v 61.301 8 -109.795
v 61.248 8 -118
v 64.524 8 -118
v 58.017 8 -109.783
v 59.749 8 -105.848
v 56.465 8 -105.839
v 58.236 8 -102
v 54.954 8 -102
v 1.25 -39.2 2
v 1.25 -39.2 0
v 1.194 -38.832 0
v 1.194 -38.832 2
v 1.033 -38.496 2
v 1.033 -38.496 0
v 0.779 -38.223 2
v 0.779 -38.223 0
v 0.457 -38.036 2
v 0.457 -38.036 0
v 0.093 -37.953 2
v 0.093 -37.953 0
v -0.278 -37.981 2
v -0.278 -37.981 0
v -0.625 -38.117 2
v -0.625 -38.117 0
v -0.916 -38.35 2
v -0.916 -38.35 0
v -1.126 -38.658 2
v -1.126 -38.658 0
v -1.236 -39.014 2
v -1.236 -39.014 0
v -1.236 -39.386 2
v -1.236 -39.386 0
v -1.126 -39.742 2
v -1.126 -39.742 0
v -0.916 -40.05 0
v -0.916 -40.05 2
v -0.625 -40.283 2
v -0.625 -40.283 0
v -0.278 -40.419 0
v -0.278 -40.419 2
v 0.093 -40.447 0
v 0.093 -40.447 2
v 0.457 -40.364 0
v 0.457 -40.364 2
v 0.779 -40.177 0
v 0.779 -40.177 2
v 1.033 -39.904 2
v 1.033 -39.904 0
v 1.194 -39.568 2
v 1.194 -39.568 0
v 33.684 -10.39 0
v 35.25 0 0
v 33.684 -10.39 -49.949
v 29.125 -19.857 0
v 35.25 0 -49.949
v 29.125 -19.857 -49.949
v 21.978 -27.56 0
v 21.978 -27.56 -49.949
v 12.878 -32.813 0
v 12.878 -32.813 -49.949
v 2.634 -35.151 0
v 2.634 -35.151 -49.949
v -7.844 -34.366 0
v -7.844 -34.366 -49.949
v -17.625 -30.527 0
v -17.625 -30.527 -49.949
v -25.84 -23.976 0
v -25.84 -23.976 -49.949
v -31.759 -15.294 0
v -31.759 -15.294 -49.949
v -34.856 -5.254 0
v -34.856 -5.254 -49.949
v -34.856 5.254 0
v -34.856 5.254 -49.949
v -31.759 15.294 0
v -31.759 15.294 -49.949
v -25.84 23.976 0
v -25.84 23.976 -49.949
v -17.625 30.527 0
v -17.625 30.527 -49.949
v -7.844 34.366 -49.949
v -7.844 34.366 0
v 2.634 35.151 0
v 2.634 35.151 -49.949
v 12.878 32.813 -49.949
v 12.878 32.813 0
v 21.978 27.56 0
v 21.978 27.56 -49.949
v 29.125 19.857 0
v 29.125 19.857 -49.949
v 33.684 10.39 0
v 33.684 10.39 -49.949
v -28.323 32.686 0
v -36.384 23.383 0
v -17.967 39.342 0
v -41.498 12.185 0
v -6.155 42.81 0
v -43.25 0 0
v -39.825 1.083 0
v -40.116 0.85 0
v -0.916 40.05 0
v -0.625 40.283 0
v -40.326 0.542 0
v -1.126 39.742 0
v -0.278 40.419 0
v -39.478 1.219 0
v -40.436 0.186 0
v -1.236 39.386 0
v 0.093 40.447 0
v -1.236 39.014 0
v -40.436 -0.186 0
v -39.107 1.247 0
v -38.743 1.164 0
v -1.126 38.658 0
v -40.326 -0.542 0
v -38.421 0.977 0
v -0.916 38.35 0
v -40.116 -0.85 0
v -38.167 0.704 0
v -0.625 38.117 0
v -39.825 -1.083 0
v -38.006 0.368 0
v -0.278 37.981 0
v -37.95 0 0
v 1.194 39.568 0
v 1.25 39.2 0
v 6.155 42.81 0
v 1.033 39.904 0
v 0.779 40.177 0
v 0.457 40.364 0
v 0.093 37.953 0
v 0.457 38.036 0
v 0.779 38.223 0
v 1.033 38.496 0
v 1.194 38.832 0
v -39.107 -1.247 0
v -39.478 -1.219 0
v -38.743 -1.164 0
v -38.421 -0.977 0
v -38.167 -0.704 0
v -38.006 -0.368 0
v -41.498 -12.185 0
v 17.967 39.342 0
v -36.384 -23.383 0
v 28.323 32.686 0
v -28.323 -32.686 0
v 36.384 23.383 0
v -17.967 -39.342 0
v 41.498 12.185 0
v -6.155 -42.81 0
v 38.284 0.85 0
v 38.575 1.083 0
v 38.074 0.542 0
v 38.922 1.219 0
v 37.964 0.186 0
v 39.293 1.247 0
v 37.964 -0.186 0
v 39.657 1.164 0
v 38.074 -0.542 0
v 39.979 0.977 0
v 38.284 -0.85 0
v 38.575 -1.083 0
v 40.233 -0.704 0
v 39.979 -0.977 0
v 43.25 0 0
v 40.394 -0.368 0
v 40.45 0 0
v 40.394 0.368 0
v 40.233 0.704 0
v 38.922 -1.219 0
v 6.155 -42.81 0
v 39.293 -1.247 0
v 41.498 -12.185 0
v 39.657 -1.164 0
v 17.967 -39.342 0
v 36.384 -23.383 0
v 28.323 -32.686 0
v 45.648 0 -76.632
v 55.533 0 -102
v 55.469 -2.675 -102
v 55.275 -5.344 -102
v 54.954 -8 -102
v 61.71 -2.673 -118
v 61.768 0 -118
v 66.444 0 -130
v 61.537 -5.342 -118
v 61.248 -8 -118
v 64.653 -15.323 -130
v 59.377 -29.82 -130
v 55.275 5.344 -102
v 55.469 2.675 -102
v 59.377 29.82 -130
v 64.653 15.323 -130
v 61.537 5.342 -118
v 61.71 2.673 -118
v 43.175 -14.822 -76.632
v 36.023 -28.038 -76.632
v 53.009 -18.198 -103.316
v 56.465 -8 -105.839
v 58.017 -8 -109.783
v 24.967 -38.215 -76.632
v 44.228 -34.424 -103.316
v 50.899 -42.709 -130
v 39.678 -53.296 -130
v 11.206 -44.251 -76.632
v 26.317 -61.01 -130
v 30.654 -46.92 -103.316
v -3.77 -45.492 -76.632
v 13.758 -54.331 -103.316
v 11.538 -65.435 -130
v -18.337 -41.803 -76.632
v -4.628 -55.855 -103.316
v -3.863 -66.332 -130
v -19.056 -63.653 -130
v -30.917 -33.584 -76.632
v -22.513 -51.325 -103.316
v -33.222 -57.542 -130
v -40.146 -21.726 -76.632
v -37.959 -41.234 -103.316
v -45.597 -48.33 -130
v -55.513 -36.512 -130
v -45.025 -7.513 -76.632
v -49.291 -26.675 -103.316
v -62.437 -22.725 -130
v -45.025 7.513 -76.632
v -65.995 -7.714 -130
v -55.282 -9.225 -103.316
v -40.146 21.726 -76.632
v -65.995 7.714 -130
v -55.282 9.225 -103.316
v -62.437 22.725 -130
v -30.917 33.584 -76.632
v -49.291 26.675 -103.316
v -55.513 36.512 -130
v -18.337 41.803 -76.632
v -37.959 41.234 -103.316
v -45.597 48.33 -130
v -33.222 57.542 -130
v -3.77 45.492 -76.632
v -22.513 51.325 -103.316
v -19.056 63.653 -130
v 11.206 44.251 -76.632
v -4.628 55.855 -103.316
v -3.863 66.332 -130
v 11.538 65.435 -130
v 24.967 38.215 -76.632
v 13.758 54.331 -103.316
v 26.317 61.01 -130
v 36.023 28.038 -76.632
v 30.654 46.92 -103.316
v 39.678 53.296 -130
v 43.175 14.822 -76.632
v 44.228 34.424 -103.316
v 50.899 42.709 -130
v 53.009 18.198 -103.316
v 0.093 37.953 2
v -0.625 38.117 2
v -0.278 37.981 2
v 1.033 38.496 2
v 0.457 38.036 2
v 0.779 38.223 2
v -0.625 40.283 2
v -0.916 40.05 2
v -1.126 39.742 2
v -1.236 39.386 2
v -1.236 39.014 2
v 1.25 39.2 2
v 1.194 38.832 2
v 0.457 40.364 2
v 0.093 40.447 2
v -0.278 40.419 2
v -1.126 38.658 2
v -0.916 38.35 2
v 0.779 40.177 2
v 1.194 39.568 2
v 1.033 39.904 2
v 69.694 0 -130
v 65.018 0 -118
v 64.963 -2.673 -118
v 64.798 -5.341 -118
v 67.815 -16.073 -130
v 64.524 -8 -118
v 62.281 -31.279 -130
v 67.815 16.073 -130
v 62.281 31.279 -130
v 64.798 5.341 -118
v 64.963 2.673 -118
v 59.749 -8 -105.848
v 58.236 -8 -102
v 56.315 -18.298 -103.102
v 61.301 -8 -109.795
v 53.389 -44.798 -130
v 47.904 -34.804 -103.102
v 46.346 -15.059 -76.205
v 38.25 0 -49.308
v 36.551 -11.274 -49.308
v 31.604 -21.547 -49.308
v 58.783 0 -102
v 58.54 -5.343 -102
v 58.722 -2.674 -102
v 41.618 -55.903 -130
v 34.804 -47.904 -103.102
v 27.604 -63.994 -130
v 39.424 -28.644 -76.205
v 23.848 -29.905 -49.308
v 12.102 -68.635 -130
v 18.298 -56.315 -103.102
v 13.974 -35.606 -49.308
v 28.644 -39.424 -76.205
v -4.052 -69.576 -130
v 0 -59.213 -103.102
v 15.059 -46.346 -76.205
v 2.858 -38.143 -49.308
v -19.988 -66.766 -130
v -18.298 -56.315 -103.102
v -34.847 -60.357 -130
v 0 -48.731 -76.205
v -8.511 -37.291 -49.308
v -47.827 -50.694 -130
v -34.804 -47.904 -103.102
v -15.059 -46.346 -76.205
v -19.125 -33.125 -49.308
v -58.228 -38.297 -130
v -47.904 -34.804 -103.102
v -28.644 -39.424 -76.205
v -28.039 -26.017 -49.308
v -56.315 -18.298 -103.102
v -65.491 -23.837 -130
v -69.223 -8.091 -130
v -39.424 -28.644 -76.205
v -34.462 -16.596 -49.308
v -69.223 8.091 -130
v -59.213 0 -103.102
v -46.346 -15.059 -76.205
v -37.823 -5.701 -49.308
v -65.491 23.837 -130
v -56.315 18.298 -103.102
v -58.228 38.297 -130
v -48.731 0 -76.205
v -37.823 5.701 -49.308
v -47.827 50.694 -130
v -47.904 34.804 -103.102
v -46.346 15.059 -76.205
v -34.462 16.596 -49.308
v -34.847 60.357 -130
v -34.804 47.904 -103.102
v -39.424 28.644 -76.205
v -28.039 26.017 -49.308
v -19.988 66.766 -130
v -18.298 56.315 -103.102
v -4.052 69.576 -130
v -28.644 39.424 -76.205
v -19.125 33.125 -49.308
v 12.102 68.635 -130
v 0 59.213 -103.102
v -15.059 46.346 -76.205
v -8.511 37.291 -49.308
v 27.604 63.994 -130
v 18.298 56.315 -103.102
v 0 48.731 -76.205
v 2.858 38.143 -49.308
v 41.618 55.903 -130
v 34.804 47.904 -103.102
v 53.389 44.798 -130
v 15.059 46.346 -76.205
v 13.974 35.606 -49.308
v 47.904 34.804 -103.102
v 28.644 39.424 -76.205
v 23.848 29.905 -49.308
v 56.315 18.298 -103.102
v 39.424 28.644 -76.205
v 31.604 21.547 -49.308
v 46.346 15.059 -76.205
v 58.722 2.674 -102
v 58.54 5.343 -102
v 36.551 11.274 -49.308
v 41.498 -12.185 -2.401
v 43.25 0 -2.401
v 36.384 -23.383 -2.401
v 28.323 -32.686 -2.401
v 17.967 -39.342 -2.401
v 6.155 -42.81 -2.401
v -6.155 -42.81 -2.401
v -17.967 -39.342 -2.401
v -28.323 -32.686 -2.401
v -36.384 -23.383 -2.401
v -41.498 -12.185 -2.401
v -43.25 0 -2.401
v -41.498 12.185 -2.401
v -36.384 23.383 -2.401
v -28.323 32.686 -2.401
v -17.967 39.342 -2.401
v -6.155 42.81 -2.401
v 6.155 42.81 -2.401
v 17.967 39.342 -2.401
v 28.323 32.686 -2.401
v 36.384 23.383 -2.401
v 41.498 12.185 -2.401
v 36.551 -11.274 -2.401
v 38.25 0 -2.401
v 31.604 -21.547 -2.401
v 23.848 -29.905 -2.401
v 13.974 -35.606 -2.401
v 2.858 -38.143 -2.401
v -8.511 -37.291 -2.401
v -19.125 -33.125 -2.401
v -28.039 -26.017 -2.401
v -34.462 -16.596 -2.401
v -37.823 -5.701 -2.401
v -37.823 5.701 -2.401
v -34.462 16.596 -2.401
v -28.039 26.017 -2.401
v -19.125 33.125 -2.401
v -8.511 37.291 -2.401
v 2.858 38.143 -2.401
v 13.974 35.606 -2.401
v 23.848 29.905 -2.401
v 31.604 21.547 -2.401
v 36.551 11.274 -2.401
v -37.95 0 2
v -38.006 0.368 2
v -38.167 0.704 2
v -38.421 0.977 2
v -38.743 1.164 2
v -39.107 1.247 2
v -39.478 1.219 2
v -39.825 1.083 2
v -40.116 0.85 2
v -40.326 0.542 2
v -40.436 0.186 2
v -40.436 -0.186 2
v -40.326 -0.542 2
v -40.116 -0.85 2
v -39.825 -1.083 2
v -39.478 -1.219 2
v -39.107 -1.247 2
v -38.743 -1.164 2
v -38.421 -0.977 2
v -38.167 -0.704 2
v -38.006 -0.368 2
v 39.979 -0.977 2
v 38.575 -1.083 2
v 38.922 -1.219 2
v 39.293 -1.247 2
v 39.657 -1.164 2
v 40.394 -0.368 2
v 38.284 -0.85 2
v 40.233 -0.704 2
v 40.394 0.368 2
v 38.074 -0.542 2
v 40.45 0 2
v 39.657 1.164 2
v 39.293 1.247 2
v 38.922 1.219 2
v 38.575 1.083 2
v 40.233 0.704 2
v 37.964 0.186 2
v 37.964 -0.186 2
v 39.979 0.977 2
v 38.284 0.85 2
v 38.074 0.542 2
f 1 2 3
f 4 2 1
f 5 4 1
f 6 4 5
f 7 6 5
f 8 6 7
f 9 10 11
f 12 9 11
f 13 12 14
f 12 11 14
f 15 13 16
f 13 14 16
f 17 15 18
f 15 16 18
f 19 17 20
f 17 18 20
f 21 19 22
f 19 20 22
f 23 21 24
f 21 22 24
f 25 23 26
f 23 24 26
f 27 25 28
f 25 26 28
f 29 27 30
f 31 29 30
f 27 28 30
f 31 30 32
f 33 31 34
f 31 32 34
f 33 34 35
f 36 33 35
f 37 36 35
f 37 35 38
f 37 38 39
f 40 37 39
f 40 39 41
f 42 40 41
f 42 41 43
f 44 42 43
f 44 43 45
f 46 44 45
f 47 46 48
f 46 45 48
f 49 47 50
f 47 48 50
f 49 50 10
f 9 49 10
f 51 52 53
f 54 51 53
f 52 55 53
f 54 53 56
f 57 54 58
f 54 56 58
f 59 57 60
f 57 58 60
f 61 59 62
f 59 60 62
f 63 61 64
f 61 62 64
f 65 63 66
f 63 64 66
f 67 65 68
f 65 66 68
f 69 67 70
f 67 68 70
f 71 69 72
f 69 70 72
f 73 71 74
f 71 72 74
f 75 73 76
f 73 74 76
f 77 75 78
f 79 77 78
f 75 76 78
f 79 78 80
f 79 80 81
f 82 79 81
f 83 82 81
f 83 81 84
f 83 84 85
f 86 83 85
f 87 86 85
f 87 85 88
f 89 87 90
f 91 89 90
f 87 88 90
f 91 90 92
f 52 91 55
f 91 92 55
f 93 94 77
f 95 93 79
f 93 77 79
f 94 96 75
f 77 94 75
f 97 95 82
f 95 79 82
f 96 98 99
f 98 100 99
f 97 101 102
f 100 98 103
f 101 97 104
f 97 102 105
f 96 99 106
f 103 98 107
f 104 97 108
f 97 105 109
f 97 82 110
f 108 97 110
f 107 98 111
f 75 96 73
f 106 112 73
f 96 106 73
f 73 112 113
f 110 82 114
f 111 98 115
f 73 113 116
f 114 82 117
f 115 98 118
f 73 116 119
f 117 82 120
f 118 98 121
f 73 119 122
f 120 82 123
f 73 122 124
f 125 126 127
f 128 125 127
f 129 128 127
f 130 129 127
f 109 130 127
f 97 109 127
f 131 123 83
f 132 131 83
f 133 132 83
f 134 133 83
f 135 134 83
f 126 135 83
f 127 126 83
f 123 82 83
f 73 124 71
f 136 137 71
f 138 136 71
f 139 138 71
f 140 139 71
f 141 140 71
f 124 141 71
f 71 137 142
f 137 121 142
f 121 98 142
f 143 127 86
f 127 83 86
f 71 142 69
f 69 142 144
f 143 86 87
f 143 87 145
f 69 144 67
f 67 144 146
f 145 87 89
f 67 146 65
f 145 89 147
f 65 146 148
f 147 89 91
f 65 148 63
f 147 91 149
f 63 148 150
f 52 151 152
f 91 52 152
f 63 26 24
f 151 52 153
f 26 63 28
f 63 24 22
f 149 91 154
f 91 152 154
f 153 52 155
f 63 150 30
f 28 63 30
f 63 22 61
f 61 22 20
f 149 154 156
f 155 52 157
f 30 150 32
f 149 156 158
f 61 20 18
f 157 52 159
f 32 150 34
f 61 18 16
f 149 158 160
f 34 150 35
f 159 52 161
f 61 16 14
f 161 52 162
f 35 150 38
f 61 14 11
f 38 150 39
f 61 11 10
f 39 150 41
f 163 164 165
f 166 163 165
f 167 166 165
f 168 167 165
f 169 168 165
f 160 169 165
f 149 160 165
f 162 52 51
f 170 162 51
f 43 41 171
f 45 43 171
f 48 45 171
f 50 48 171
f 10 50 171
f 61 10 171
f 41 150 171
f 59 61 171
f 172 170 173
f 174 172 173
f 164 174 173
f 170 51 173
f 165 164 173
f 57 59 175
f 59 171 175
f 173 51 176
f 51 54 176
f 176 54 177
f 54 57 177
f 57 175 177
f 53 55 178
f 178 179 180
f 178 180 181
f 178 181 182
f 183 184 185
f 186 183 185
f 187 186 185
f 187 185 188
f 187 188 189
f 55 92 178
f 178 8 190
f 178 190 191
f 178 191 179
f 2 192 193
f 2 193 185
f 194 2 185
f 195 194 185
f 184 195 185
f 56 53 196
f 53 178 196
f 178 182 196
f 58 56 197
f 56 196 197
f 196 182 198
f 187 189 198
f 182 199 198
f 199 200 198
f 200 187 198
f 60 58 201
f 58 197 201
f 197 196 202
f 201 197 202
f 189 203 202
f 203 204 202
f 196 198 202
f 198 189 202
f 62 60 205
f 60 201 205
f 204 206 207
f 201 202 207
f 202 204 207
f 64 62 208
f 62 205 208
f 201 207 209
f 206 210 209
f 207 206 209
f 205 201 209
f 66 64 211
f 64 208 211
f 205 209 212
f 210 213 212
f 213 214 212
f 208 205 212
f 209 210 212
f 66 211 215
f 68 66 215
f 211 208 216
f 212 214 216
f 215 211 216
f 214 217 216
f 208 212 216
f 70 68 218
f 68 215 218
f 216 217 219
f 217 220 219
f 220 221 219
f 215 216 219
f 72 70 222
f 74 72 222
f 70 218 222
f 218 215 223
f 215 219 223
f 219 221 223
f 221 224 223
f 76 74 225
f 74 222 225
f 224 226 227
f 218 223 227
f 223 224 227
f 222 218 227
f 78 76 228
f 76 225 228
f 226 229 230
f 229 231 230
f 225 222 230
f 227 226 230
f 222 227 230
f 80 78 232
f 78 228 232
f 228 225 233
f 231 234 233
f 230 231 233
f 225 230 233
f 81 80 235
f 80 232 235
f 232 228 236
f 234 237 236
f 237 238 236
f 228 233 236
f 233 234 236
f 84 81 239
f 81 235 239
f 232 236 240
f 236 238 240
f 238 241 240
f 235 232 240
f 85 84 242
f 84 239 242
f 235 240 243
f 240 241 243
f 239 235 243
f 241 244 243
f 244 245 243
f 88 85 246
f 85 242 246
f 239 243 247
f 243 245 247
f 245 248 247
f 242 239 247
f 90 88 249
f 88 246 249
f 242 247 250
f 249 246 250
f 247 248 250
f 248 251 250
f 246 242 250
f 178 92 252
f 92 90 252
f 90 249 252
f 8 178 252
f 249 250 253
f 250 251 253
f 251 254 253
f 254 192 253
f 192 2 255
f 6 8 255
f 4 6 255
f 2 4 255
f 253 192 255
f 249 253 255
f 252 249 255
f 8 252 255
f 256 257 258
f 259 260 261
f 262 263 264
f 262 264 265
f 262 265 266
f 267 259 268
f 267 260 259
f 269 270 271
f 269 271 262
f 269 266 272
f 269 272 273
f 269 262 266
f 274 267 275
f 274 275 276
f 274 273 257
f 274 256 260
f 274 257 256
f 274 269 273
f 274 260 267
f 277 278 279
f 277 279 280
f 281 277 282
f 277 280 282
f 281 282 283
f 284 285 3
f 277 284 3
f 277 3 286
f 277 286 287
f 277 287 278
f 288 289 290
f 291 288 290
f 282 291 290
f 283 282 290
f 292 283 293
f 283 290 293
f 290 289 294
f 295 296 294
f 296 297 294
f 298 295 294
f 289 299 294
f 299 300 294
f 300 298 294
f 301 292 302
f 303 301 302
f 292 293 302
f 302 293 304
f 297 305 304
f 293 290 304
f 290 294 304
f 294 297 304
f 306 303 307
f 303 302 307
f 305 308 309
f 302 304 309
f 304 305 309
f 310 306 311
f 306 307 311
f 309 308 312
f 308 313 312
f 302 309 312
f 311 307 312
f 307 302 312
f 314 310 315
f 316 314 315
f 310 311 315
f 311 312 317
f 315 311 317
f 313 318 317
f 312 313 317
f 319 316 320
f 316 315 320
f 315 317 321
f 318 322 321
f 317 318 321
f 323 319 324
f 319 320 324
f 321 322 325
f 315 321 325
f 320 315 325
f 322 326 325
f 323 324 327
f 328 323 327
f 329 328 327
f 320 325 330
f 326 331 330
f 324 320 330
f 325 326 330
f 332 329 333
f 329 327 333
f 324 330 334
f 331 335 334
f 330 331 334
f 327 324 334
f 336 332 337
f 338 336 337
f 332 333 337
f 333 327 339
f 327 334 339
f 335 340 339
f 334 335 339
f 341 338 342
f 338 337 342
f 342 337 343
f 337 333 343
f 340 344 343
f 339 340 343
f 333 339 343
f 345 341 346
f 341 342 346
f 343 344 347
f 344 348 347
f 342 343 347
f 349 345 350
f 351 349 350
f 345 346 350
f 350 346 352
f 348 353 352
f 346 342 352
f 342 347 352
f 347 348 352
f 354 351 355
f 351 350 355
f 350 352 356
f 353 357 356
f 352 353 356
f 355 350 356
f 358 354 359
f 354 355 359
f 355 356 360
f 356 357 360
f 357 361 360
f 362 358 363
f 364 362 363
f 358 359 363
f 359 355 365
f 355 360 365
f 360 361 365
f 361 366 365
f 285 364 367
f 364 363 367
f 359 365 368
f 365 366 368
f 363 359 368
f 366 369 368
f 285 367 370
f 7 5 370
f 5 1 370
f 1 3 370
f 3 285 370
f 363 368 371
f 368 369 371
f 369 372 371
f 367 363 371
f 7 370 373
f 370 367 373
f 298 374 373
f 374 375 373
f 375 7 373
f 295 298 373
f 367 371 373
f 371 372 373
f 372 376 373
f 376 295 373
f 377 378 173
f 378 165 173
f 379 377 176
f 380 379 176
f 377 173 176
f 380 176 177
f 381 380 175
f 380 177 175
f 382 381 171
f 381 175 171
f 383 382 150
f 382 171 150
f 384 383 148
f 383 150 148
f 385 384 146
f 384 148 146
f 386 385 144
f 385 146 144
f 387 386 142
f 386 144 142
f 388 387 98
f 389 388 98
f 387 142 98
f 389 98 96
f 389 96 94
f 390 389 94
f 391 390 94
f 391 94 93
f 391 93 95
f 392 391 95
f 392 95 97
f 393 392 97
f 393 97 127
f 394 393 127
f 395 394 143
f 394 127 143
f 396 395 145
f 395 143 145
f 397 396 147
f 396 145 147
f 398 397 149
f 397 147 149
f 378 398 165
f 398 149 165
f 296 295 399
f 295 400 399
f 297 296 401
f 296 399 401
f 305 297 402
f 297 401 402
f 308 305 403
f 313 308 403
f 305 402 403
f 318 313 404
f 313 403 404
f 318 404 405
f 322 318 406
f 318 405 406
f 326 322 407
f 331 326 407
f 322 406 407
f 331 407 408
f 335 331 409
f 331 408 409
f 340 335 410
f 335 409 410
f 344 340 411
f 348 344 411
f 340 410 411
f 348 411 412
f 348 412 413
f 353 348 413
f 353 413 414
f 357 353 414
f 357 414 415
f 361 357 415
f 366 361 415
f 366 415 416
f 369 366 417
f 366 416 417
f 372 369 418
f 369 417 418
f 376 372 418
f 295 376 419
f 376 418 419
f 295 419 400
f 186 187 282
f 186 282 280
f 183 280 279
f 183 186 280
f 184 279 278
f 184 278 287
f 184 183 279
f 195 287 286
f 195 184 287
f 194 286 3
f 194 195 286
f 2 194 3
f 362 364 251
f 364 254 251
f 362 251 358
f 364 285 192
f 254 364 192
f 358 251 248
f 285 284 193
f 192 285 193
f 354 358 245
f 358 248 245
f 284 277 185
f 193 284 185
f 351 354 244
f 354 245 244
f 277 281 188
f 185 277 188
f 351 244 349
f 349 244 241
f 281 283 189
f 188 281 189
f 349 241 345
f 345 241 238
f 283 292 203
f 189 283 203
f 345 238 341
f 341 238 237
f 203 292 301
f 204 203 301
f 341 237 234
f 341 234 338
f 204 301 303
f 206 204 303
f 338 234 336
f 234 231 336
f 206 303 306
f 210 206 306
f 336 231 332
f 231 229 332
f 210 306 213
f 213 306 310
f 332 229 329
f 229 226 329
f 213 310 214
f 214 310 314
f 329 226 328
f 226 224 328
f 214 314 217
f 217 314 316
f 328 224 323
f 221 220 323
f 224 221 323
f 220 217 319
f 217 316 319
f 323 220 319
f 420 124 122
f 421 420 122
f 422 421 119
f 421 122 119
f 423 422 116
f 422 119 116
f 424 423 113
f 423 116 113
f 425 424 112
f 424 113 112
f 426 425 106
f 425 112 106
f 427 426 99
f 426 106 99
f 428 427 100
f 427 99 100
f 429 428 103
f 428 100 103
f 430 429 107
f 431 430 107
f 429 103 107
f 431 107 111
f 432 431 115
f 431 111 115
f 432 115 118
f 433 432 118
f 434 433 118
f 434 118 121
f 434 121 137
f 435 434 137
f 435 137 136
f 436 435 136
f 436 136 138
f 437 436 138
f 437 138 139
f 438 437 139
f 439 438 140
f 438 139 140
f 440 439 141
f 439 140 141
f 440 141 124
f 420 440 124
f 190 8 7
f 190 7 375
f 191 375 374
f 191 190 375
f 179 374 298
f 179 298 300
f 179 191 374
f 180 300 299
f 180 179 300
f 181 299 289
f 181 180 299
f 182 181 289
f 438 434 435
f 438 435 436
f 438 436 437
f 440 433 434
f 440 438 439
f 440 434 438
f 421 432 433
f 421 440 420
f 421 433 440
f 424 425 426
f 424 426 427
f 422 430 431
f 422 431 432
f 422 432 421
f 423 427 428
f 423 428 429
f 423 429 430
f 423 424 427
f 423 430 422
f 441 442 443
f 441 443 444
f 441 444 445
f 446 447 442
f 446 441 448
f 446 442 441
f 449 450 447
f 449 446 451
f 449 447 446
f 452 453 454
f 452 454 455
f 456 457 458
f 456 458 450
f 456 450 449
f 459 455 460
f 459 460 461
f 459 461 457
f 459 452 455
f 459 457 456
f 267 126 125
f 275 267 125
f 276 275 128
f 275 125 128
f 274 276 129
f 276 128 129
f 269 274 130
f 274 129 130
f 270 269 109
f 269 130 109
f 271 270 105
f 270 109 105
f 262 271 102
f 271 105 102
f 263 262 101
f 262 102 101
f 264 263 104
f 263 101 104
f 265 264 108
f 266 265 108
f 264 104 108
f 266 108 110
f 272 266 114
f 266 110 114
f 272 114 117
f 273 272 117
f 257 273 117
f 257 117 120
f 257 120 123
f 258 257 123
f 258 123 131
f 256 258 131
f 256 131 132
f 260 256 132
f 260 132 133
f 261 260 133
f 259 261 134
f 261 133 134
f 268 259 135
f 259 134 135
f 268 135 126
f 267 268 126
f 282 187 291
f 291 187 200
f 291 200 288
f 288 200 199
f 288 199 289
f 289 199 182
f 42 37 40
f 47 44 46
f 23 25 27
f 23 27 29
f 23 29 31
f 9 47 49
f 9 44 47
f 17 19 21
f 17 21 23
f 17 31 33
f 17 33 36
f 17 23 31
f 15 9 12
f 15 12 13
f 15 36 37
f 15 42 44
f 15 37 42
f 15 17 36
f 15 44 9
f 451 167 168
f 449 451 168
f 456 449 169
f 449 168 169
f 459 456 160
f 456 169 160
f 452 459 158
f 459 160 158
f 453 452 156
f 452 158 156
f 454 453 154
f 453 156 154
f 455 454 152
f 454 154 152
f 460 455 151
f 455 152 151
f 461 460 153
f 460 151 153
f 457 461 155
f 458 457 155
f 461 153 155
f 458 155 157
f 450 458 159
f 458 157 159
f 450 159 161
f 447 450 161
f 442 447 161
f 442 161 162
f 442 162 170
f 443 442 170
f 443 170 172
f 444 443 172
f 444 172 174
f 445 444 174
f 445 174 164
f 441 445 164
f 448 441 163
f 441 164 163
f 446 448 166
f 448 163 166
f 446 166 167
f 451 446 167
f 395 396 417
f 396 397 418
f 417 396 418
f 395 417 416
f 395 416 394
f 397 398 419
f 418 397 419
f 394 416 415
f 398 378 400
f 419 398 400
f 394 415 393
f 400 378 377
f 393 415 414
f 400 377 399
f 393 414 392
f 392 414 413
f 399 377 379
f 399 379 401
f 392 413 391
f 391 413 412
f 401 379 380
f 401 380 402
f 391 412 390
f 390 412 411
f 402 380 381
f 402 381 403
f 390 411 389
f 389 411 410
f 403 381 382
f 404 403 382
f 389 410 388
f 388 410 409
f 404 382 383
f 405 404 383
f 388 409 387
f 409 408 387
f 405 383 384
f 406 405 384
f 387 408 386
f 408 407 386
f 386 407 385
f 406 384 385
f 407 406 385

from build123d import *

# Parameters (mm, degrees)
F2_W     = 8
F2_H     = 16
F3_DEPTH = 77.17437
F4_R     = 1.25
F5_DEPTH = 2


with BuildPart() as f1:
    # F0 (on Front) → F1 (revolve)
    with BuildSketch(Plane.XZ):
        Polygon((43.25, 0), (35.25, 0), (35.25, -49.948681), (66.444077, -130), (69.693929, -130), (38.25, -49.3075), (38.25, -2.400862), (43.25, -2.400862), align=None)
    revolve(axis=Axis((0, 0, -40), (0, 0, -1)))

    # F2 (on Right) → F3 (cut)
    with BuildSketch(Plane.YZ):
        with Locations((-4, -110)):
            Rectangle(F2_W, F2_H)
        with Locations((4, -110)):
            Rectangle(F2_W, F2_H)
    extrude(amount=F3_DEPTH, mode=Mode.SUBTRACT)

    # F4 (on face) → F5 (join)
    with BuildSketch(Plane.XY):
        with Locations((0, 39.2)):
            Circle(F4_R)
        with Locations((-39.2, 0)):
            Circle(F4_R)
        with Locations((0, -39.2)):
            Circle(F4_R)
        with Locations((39.2, 0)):
            Circle(F4_R)
    extrude(amount=F5_DEPTH)


solid = f1.part
